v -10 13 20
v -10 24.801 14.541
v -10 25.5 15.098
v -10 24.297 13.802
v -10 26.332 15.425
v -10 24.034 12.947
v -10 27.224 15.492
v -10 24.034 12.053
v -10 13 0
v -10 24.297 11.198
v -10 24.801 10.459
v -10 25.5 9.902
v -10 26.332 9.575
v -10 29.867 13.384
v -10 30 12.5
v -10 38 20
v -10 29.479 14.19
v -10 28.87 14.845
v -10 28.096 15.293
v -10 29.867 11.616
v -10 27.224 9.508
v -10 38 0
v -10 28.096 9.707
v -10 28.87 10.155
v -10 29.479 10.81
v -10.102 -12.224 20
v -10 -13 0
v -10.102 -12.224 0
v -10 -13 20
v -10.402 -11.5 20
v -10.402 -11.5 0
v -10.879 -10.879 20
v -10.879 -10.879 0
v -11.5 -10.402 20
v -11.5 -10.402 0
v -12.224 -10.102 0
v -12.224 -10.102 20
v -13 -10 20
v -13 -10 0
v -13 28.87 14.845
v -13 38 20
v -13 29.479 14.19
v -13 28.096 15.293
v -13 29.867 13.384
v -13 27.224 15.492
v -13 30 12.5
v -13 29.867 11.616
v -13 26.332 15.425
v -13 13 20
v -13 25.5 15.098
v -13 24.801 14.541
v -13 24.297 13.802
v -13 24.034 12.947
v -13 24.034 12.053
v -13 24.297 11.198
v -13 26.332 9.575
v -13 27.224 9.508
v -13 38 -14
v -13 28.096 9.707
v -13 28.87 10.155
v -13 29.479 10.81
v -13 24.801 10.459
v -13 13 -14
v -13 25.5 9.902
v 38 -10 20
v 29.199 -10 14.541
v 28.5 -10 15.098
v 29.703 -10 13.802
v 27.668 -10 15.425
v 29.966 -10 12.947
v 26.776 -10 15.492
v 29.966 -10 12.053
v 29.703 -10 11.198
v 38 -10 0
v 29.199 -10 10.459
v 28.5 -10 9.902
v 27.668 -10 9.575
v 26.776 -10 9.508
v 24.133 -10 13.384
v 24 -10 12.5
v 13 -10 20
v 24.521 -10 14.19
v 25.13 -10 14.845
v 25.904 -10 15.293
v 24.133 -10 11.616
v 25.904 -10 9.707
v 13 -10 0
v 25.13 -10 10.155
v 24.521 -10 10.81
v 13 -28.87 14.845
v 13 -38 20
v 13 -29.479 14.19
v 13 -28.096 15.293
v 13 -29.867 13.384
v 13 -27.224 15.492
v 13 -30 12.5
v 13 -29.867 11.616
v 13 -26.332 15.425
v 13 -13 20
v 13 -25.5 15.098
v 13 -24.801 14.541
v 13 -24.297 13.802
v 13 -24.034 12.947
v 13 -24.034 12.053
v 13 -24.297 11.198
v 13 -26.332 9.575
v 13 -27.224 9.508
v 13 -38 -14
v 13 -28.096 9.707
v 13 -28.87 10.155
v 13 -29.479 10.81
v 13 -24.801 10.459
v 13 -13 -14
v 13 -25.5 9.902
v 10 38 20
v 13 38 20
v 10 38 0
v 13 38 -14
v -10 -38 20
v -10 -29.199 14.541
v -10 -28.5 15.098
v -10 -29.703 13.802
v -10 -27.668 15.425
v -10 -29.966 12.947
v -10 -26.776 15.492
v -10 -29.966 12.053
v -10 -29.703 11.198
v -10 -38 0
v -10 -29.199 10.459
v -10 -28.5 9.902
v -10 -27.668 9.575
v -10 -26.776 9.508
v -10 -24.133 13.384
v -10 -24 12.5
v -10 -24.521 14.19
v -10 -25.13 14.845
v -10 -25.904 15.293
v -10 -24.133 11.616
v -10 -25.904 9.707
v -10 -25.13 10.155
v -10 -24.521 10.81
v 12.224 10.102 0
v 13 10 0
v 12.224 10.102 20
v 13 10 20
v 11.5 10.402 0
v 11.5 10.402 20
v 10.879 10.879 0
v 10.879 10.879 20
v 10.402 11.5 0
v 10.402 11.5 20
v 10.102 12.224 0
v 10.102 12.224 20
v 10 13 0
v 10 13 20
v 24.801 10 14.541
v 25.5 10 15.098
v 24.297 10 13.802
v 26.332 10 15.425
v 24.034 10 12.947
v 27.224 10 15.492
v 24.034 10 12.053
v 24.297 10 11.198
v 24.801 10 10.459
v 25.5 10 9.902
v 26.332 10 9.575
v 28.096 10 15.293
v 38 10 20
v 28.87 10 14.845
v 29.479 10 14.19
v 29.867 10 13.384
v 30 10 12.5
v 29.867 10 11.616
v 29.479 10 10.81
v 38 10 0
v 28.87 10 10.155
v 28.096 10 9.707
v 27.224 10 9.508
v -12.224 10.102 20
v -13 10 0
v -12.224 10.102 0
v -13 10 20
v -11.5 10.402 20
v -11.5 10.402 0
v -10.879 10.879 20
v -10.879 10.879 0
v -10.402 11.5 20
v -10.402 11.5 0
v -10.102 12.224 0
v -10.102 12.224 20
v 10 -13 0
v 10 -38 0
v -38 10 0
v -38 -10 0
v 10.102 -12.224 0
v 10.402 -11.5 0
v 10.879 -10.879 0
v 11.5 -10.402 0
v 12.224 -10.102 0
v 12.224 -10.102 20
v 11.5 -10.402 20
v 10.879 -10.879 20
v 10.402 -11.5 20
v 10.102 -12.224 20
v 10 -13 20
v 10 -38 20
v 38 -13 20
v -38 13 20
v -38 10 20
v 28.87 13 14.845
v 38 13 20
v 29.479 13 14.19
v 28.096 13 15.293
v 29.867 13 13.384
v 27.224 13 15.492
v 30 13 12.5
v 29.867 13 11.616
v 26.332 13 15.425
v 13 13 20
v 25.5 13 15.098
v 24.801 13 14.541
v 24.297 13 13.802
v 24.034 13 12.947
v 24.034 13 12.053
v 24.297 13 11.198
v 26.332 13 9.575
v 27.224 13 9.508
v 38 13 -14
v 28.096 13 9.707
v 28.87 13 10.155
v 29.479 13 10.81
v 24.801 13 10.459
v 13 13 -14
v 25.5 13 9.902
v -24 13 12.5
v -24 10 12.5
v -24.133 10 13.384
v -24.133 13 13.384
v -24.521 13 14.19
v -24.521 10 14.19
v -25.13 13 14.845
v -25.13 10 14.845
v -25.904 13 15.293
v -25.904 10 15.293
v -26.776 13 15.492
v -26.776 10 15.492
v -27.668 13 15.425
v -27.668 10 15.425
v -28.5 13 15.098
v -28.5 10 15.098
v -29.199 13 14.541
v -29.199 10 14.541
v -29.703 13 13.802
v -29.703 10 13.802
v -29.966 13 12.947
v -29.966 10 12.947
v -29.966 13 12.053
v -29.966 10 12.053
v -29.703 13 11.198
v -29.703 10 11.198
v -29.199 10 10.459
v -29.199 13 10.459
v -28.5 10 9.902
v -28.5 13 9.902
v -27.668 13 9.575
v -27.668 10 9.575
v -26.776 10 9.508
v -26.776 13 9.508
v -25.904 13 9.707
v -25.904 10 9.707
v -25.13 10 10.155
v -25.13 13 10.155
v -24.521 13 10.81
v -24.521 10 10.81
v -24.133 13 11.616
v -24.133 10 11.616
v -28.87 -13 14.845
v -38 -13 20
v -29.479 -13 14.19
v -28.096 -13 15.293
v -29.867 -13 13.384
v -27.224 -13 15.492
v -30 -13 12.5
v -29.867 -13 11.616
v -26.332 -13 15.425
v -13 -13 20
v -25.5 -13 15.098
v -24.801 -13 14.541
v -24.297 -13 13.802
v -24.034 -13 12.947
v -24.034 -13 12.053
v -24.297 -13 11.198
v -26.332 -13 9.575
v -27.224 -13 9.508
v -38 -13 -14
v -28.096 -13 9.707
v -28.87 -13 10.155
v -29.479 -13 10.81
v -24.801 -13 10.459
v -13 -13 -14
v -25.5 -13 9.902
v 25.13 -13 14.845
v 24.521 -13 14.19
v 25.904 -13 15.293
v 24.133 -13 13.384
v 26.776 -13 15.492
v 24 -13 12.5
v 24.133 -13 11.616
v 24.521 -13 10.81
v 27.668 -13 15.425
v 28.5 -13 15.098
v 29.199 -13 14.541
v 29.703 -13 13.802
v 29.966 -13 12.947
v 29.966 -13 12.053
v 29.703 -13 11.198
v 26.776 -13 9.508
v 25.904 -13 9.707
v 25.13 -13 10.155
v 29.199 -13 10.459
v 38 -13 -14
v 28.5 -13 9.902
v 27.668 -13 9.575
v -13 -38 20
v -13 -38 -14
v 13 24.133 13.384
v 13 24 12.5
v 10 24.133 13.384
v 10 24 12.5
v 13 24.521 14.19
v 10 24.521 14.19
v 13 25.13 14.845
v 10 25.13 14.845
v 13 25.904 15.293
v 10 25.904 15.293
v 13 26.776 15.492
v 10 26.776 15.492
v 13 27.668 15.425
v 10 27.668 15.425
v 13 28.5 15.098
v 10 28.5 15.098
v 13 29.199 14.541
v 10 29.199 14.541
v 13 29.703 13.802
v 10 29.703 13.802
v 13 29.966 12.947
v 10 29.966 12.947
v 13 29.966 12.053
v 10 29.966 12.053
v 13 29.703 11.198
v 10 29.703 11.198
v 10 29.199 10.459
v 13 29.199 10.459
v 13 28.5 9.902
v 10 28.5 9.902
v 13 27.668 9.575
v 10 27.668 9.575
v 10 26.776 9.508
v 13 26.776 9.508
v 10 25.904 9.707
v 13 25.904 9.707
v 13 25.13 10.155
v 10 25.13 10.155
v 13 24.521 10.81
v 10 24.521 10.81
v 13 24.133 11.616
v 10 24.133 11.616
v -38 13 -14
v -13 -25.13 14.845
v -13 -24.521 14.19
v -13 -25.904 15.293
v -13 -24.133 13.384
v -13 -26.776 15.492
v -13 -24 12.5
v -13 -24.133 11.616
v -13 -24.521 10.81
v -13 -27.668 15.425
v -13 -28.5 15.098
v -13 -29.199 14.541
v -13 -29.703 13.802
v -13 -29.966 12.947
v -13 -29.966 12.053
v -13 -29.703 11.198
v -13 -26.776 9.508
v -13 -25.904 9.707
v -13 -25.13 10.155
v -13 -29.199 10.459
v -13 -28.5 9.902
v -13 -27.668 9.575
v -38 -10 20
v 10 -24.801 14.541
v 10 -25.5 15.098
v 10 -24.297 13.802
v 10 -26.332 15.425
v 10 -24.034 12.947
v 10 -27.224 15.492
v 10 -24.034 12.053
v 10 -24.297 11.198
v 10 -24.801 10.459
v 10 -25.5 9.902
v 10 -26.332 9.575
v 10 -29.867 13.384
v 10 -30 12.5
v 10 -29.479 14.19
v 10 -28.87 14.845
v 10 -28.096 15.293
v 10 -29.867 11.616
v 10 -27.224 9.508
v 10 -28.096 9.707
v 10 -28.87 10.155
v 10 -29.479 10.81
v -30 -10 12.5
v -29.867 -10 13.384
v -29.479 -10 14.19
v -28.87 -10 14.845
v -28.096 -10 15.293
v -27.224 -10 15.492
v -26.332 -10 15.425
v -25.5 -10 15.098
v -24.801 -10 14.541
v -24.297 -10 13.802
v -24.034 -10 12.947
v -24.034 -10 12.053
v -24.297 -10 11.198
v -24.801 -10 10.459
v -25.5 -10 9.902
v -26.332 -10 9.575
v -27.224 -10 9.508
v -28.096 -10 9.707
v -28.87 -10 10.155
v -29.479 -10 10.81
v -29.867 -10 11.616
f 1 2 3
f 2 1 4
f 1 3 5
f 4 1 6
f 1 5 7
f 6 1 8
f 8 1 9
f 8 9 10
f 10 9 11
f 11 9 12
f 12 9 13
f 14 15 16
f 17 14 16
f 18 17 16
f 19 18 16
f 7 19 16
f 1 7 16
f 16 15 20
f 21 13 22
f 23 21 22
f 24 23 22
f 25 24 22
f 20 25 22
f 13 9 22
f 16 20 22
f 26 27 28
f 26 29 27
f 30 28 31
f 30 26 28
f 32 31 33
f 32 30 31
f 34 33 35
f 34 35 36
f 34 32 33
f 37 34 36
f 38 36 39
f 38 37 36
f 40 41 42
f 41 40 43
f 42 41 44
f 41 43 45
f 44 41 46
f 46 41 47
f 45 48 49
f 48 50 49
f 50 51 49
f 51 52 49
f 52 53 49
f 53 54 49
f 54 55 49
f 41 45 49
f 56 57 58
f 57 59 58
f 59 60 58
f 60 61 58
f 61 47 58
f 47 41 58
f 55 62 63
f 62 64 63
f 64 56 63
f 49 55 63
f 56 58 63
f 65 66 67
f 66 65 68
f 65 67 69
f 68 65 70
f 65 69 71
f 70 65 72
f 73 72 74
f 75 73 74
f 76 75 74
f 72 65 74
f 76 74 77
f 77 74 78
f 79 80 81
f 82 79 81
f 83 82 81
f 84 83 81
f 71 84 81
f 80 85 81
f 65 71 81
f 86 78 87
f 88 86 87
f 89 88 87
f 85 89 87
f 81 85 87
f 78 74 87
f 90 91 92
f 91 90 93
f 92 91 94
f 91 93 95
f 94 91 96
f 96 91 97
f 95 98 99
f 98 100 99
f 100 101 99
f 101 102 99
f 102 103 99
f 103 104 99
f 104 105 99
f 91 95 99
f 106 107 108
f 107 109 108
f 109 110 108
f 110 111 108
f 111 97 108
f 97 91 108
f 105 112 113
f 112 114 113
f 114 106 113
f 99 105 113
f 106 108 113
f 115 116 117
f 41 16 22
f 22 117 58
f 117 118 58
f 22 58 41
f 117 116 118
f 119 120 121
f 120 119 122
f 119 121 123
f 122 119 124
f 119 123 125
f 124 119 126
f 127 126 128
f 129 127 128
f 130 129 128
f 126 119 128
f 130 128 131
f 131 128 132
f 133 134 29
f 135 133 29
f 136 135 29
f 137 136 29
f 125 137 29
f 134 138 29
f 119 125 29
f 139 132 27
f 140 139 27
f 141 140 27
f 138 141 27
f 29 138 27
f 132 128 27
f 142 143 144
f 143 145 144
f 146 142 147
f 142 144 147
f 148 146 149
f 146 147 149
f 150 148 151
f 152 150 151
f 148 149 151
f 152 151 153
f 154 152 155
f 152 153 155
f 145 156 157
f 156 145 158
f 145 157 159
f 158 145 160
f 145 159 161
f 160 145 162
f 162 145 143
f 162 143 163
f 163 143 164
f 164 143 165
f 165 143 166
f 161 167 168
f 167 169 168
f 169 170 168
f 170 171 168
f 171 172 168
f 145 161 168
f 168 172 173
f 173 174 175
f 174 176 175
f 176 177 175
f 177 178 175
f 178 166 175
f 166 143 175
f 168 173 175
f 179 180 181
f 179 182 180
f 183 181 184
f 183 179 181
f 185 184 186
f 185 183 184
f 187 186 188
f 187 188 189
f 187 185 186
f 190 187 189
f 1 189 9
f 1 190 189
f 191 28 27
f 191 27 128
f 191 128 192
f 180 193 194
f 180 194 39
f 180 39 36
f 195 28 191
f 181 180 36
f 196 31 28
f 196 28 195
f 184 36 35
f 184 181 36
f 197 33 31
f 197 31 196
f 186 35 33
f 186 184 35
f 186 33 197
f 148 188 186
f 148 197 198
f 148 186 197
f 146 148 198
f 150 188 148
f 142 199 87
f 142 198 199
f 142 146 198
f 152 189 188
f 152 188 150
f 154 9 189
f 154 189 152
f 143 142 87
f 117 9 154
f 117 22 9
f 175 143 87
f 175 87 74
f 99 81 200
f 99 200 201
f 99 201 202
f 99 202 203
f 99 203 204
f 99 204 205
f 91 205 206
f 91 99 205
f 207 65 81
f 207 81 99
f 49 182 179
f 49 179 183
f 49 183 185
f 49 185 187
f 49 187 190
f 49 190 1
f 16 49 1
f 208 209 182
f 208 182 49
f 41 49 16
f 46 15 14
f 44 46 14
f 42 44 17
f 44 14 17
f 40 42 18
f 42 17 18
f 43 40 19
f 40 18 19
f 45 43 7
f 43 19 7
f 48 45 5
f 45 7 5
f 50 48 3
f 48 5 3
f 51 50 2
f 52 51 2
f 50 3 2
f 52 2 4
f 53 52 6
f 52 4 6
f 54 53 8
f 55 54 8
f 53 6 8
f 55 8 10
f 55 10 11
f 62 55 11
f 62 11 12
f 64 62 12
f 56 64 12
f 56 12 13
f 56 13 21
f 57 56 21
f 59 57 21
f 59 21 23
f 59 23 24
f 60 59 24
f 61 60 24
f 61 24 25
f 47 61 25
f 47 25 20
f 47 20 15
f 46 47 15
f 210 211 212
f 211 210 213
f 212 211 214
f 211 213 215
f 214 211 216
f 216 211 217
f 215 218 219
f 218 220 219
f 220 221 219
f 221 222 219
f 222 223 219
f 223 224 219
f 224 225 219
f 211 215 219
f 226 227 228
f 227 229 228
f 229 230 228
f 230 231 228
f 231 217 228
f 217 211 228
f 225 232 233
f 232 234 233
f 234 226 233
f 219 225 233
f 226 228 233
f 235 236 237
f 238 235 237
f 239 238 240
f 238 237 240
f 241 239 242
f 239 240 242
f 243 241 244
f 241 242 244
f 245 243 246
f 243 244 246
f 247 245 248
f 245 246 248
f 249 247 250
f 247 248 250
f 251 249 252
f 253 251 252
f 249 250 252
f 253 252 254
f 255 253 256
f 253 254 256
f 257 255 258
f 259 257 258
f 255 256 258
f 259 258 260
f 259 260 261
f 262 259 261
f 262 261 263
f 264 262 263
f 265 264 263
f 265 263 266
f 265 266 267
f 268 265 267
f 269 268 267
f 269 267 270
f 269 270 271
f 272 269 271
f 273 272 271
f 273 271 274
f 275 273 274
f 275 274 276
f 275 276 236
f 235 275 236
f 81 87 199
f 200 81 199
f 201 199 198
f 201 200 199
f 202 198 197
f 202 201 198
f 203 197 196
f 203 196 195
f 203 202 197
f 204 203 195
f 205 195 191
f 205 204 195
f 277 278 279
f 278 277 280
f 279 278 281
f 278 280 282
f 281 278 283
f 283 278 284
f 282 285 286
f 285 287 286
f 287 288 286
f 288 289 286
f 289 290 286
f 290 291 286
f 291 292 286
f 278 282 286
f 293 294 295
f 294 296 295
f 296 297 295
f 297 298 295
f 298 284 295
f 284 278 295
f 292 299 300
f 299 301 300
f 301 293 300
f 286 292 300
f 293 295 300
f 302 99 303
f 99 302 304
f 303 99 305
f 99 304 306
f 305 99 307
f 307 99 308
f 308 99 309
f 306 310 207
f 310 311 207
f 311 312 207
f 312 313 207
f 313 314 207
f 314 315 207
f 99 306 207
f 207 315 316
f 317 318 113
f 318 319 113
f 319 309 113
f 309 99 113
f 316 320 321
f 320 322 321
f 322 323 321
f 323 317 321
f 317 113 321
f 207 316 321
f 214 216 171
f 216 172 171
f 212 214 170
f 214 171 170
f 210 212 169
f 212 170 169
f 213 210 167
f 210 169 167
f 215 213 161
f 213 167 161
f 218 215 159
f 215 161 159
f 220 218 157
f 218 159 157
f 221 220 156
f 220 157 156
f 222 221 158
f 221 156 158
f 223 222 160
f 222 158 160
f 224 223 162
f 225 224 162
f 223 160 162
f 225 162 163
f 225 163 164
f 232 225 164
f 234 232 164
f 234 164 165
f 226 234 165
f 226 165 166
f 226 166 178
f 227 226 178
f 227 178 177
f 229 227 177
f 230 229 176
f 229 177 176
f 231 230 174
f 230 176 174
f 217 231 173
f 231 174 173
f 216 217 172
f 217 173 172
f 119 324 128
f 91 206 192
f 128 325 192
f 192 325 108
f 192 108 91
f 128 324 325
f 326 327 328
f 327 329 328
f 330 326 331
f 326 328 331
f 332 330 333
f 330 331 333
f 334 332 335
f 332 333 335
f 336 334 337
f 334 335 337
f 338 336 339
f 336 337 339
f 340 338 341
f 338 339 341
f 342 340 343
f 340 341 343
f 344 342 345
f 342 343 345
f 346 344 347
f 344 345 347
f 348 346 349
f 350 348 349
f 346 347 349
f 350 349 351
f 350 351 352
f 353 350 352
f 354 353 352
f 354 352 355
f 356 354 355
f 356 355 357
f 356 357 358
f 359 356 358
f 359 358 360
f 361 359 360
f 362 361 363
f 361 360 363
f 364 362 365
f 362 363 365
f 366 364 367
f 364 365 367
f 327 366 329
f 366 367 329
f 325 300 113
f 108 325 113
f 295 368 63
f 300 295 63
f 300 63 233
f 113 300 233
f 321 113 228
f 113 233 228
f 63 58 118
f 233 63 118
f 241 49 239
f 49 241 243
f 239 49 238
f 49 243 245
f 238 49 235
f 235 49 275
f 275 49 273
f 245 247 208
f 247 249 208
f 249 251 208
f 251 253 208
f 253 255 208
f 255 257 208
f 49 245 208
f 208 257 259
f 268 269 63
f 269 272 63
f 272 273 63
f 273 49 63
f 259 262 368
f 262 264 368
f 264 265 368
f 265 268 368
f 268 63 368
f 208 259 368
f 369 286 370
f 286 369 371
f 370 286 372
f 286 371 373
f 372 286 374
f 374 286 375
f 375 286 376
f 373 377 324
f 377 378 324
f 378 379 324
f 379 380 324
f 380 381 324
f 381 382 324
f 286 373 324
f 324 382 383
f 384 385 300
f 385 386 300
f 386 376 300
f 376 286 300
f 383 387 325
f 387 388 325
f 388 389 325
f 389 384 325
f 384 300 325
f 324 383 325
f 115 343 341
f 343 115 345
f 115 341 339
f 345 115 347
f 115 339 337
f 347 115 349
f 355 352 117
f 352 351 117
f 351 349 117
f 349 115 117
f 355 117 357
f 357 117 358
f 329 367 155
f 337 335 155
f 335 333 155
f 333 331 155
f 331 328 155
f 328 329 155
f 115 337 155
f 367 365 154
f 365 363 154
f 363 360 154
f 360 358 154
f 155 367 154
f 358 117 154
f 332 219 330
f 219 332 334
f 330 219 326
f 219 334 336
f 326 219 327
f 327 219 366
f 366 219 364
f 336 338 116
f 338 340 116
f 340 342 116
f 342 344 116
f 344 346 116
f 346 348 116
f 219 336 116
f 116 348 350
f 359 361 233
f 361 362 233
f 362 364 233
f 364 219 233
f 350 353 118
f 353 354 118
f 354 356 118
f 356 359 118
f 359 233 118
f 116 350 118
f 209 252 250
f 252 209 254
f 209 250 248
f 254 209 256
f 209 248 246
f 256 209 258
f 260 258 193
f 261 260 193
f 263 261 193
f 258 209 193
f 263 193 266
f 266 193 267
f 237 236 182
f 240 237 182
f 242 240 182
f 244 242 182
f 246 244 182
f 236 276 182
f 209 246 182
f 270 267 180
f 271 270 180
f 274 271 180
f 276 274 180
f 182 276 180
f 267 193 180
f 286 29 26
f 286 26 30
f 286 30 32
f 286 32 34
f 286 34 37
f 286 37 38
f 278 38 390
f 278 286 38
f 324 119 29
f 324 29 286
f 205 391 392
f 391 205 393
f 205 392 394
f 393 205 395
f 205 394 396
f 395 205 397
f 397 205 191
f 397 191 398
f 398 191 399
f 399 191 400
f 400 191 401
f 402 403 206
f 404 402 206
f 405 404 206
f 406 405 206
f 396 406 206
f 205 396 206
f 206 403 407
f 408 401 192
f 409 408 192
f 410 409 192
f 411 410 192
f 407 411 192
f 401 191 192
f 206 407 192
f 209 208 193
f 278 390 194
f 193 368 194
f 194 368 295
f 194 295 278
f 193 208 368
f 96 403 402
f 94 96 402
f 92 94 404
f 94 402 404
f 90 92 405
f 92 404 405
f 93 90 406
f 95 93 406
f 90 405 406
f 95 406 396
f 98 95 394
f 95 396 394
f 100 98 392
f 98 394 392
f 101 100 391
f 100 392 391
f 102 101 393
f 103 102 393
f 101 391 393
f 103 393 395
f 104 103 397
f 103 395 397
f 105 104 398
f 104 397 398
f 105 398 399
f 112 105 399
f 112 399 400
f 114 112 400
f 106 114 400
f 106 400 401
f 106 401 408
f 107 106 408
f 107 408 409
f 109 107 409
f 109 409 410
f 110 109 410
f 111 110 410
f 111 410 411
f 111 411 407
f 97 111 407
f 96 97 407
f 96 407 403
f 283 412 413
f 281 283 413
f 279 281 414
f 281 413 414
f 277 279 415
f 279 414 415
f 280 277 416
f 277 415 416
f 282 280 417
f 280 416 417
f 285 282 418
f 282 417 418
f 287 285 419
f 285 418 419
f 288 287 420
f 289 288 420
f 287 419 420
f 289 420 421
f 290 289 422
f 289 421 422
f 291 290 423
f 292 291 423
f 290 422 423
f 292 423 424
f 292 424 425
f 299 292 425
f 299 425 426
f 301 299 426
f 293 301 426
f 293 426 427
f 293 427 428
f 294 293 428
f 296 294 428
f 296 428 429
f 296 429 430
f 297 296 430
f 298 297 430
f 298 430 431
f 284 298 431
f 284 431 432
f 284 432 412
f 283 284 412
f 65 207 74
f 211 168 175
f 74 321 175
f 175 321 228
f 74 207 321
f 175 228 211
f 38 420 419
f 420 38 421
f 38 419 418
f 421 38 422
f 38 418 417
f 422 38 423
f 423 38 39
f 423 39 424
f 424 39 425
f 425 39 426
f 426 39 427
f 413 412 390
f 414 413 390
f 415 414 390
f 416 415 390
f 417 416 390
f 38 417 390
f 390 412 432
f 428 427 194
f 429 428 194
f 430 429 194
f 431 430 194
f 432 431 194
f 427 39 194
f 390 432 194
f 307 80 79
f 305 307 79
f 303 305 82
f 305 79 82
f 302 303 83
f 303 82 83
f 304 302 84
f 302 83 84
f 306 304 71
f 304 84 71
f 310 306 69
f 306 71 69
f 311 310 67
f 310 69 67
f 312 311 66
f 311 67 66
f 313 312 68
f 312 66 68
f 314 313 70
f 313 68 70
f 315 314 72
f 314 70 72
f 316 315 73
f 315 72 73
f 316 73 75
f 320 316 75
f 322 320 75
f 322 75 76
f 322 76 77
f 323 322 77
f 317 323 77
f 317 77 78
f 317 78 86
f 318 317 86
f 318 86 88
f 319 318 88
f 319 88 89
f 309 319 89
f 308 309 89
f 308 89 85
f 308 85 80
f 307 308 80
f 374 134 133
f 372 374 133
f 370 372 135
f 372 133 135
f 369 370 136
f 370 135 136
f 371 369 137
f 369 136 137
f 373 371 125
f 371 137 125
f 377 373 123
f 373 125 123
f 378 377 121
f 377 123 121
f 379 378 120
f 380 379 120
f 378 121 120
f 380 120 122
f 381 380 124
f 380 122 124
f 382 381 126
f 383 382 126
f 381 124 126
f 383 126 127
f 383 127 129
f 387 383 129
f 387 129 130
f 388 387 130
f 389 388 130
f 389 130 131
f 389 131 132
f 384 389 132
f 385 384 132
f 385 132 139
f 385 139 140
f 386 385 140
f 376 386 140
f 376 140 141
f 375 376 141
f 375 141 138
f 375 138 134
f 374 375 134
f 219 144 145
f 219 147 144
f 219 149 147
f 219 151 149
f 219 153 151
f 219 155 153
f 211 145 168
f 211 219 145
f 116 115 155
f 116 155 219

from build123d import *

# Parameters (mm, degrees)
F3_DEPTH              = 14
F5_DEPTH              = 20
F5_COPIES_COUNT       = 4
F8_D                  = 6
F8_DEPTH              = 3
F8_TIP                = 1.8025818571
F8_ON_F6_D            = 6
F8_ON_F6_DEPTH        = 3
F8_ON_F6_TIP          = 1.8025818571
F8_COPIES_COUNT       = 4
F8_ON_F6_COPIES_COUNT = 4
F9_R                  = 3


# Not quite as in the source:
# - a pattern or mirror of a feature is missing from the dataset's text; its kind, count and spacing are read off the source's solid


with BuildPart() as f3:
    # F2 (on Top) → F3 (new body)
    with BuildSketch(Plane.XY):
        Polygon((-13, 38), (-13, 13), (-38, 13), (-38, -13), (-13, -13), (-13, -38), (13, -38), (13, -13), (38, -13), (38, 13), (13, 13), (13, 38), align=None)
    extrude(amount=-F3_DEPTH)

    # F4 (on Top) → F5 (join)
    with BuildSketch(Plane.XY):
        Polygon((13, 38), (10, 38), (10, 10), (38, 10), (38, 13), (13, 13), align=None)
    f5 = extrude(amount=F5_DEPTH)

    # F5_copies: F5 ×4 about axis
    f5_copies_axis = Axis((0, 0, 0), (0, 0, 1))
    for i in range(1, F5_COPIES_COUNT):
        add(f5.rotate(f5_copies_axis, i * 360 / F5_COPIES_COUNT))

    # F8
    with Locations(Plane.YZ.offset(13)):
        with Locations((27, 12.5)):
            f8 = Hole(F8_D / 2, depth=F8_DEPTH)
            with Locations((0, 0, -(F8_DEPTH + F8_TIP / 2))):  # 118° drill point
                Cone(0, F8_D / 2, F8_TIP, mode=Mode.SUBTRACT)

    # F8 on F6
    with Locations(Plane(origin=(0, 13, 0), x_dir=(-1, 0, 0), z_dir=(0, 1, 0))):
        with Locations((-27, 12.5)):
            f8_on_f6 = Hole(F8_ON_F6_D / 2, depth=F8_ON_F6_DEPTH)
            with Locations((0, 0, -(F8_ON_F6_DEPTH + F8_ON_F6_TIP / 2))):  # 118° drill point
                Cone(0, F8_ON_F6_D / 2, F8_ON_F6_TIP, mode=Mode.SUBTRACT)

    # F8_copies: F8 ×4 about axis
    f8_copies_axis = Axis((0, 0, 0), (0, 0, 1))
    for i in range(1, F8_COPIES_COUNT):
        add(f8.rotate(f8_copies_axis, i * 360 / F8_COPIES_COUNT), mode=Mode.SUBTRACT)

    # F8 on F6_copies: F8 on F6 ×4 about axis
    f8_on_f6_copies_axis = Axis((0, 0, 0), (0, 0, 1))
    for i in range(1, F8_ON_F6_COPIES_COUNT):
        add(f8_on_f6.rotate(f8_on_f6_copies_axis, i * 360 / F8_ON_F6_COPIES_COUNT), mode=Mode.SUBTRACT)

    # F9
    f9_edges = [f3.edges().sort_by_distance(p)[0] for p in [
        (10, 10, 10),
        (-10, 10, 10),
        (-10, -10, 10),
        (10, -10, 10),
    ]]
    fillet(f9_edges, radius=F9_R)


solid = f3.part
